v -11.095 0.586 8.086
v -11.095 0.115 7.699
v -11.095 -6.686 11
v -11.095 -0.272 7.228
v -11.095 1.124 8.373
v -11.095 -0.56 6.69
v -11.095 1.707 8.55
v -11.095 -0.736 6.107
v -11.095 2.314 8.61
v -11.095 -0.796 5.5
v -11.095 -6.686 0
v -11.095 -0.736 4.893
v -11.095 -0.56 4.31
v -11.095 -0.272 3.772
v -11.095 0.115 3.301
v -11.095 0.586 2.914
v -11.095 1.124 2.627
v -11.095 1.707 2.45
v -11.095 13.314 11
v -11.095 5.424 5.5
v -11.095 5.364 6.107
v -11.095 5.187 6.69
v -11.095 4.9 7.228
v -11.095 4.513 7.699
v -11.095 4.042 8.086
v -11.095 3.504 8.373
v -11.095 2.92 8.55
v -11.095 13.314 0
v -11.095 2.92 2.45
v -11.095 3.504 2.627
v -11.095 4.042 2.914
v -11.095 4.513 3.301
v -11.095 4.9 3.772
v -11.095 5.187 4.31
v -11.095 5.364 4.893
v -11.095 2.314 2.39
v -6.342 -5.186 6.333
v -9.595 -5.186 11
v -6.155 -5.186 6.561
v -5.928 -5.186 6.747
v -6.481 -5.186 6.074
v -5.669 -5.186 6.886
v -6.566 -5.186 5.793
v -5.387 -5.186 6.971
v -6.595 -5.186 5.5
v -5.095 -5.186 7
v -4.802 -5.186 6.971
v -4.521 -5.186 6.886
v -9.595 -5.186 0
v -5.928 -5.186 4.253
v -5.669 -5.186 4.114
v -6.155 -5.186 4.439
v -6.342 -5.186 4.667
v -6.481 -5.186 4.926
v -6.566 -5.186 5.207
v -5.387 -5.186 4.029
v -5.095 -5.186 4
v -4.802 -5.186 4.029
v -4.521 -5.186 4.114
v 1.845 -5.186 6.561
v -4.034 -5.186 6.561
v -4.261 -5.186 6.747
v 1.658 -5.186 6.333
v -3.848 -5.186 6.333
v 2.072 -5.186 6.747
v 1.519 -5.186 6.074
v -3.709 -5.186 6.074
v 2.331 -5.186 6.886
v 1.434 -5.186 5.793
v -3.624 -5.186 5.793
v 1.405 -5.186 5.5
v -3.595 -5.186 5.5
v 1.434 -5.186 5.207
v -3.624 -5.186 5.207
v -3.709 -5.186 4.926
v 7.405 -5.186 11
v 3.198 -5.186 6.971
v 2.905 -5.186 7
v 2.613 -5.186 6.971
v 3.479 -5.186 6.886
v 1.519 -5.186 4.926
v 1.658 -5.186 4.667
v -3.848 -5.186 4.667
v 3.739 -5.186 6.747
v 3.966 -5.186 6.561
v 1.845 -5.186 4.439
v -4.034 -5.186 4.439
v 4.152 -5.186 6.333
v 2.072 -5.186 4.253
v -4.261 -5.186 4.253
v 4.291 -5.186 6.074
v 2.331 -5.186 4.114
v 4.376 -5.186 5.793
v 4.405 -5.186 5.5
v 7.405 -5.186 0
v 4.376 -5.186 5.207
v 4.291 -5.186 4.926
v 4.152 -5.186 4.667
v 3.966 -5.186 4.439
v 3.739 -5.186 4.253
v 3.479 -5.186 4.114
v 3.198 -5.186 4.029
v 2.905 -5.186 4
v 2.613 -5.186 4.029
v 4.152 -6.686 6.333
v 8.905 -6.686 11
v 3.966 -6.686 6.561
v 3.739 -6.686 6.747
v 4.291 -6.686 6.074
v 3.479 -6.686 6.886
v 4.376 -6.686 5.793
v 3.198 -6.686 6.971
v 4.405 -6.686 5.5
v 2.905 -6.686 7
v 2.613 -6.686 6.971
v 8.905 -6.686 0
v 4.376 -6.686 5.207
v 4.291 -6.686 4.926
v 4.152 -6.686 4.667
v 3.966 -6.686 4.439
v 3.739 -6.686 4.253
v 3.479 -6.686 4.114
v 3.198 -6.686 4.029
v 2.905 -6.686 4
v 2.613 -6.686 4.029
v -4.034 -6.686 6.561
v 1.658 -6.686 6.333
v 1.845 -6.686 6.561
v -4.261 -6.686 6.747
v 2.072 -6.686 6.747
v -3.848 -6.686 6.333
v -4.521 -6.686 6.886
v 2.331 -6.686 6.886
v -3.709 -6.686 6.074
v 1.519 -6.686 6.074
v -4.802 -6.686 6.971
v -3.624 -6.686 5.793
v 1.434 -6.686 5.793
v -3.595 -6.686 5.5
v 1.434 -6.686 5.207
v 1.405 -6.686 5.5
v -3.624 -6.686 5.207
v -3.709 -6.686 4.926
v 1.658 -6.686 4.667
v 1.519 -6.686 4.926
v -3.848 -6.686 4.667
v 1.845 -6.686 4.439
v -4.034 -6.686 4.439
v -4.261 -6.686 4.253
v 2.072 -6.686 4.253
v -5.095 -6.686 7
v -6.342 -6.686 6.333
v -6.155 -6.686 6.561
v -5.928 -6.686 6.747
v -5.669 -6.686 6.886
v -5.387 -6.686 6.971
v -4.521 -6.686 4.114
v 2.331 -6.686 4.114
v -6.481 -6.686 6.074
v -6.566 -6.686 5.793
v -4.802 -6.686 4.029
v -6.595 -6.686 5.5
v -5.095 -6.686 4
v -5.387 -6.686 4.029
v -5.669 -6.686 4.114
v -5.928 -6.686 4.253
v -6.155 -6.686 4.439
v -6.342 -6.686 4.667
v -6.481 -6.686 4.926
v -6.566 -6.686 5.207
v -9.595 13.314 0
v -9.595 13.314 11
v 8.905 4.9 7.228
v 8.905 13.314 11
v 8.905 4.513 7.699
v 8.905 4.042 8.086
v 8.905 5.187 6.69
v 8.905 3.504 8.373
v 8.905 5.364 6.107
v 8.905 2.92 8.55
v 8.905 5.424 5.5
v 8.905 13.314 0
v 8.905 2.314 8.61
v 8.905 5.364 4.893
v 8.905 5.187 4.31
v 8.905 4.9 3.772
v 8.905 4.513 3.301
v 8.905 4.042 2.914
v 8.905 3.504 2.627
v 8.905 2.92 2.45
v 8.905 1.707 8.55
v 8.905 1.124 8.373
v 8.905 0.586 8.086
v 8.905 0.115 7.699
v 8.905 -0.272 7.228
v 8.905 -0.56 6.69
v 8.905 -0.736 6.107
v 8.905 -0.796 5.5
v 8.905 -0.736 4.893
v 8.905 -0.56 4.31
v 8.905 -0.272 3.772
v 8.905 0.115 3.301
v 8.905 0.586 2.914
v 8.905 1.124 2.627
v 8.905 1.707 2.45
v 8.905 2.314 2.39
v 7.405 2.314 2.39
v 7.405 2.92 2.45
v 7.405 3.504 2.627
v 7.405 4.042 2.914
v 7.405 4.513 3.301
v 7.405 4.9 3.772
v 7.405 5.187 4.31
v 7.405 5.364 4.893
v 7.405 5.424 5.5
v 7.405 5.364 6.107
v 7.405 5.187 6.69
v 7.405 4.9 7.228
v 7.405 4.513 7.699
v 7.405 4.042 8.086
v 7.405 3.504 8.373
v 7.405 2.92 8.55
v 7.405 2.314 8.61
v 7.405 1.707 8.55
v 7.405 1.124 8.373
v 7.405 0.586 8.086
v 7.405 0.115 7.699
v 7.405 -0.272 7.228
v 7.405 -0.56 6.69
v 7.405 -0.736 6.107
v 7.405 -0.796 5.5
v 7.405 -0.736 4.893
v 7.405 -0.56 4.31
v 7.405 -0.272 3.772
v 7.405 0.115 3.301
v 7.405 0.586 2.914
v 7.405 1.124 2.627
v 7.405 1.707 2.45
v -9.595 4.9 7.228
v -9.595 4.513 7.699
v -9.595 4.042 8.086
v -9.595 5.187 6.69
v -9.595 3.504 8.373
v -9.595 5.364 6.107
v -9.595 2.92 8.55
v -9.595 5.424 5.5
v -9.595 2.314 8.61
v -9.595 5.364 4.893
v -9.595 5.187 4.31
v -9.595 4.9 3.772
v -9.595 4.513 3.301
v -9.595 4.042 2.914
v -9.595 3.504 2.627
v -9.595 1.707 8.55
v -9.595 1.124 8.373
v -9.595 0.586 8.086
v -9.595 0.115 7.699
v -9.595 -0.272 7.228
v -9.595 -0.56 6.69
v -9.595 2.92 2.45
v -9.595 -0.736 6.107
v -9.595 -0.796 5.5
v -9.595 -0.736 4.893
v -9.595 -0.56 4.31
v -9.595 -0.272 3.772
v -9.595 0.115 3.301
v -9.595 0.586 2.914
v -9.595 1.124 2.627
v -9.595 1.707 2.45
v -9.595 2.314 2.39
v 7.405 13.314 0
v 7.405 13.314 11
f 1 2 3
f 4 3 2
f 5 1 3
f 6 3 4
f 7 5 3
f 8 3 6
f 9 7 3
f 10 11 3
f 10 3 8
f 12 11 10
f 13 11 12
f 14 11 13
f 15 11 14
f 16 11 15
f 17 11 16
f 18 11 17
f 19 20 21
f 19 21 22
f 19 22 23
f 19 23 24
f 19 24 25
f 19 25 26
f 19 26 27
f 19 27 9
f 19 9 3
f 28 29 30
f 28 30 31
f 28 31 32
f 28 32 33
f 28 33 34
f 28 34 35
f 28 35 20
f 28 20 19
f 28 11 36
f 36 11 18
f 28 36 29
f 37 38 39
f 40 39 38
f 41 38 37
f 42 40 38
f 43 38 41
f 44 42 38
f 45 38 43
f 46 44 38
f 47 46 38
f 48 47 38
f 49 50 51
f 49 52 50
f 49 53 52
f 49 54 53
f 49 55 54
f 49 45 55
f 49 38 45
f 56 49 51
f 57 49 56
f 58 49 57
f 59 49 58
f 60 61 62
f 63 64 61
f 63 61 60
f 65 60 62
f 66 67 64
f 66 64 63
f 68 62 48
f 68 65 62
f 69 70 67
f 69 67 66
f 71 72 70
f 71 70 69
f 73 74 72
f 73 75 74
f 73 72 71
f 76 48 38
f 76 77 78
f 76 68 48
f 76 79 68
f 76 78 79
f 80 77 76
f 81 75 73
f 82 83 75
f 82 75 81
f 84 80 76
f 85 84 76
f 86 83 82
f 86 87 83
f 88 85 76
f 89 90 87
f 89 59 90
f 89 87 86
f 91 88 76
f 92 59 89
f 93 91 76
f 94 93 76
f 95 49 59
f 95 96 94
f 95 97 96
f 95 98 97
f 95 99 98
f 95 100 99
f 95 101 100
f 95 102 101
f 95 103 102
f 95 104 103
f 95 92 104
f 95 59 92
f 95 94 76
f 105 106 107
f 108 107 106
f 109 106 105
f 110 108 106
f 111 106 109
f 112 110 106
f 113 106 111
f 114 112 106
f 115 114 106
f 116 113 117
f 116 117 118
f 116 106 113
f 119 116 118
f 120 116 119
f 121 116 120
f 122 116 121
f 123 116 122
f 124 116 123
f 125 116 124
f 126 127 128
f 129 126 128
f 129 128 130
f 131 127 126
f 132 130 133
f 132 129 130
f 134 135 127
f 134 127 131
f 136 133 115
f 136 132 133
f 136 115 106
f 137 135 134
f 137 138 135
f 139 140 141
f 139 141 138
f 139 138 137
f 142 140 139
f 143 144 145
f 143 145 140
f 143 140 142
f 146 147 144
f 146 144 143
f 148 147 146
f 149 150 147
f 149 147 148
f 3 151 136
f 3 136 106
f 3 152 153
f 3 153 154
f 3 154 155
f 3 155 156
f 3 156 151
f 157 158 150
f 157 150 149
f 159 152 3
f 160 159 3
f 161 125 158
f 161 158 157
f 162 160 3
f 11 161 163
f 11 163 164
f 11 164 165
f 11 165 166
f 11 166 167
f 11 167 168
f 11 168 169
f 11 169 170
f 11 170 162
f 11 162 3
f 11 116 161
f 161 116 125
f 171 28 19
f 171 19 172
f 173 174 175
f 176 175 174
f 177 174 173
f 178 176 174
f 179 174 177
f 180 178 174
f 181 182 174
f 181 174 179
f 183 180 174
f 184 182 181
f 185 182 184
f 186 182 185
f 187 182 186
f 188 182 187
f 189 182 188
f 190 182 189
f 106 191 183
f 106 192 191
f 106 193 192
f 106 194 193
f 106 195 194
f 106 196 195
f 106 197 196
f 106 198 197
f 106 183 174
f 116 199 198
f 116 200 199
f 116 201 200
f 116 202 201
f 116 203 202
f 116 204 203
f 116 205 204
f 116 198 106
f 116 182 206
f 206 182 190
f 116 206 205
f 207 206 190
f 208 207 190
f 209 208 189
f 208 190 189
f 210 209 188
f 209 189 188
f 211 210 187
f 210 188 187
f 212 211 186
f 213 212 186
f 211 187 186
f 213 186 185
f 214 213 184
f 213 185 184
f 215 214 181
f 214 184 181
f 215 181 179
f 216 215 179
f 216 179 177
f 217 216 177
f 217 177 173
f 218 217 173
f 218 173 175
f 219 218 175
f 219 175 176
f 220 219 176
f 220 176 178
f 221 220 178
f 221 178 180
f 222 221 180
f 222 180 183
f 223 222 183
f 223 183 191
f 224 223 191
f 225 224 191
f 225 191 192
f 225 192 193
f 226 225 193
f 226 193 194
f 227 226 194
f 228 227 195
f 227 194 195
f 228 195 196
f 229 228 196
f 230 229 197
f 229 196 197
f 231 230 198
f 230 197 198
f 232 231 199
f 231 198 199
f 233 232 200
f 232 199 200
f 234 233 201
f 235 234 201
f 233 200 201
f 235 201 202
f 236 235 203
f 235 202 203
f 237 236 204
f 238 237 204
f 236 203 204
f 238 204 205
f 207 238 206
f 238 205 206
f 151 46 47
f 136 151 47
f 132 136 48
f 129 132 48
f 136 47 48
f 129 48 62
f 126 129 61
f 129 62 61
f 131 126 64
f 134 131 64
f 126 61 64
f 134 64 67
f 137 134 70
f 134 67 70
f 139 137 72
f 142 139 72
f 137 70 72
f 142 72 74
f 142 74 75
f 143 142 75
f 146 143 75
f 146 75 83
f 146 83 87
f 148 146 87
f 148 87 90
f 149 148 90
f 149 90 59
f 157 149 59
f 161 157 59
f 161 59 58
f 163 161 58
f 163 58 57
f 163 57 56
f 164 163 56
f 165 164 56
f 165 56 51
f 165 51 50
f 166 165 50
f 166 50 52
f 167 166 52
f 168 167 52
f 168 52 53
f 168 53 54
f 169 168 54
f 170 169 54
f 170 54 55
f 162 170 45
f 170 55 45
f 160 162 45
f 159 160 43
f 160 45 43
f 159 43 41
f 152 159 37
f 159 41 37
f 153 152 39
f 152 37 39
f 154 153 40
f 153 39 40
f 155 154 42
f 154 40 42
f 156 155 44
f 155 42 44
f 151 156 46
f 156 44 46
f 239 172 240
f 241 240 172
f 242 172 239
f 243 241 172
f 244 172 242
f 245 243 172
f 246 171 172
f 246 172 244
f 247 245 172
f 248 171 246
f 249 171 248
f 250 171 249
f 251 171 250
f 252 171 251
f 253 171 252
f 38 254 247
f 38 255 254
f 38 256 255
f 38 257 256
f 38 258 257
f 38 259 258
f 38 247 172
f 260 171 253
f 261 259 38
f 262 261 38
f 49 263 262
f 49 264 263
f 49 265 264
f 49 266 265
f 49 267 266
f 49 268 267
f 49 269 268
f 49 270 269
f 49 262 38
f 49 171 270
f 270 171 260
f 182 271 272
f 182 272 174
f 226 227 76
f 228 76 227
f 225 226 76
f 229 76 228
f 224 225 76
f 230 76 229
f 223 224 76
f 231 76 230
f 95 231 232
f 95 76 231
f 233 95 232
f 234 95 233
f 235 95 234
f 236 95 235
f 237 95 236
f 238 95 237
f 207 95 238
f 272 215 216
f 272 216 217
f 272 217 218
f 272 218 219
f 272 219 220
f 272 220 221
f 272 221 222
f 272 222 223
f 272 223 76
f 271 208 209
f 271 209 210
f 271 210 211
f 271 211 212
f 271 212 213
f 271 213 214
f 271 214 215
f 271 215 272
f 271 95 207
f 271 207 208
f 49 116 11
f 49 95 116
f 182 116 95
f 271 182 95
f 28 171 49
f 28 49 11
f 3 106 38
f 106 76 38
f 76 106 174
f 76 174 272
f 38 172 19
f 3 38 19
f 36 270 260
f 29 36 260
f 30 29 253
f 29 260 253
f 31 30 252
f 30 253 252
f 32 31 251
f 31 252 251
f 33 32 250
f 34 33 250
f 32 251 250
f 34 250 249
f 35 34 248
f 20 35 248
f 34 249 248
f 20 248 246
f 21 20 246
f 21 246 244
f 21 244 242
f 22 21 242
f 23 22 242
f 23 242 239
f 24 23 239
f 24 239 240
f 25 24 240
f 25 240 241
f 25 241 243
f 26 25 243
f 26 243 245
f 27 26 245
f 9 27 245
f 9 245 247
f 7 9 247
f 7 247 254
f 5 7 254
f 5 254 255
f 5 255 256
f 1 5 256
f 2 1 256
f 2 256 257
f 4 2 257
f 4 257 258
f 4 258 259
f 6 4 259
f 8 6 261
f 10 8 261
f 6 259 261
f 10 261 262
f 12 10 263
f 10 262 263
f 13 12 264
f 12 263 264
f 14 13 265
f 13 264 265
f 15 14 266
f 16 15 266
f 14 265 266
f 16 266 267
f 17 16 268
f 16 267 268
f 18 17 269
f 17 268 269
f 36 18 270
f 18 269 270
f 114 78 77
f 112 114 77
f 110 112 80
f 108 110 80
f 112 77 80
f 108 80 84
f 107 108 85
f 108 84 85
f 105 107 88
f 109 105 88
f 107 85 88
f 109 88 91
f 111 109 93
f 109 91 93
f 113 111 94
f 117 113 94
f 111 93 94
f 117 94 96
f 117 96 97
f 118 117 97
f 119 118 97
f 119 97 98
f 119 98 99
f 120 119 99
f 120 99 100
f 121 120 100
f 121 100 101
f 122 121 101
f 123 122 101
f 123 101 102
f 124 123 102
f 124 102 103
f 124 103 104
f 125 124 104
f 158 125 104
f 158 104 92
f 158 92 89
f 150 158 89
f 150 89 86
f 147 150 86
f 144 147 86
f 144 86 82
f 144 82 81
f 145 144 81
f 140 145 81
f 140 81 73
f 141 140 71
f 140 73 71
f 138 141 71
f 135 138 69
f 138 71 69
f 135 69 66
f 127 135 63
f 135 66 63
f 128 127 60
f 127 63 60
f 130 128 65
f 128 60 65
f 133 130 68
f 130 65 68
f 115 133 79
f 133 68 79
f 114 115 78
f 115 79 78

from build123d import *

# Parameters (mm, degrees)
EXTRUSION1_DEPTH = 11
ESQUISSE2_R      = 3.11
EXTRUSION2_DEPTH = 27.424530578
ESQUISSE3_R      = 1.5
EXTRUSION3_DEPTH = 11


with BuildPart() as part:
    # Esquisse1 → Extrusion1 (new body)
    with BuildSketch(Plane.XY):
        Polygon((-11.094787824, -6.686254611), (-11.094787824, 13.313745389), (-9.594787824, 13.313745389), (-9.594787824, -5.186254611), (7.405212176, -5.186254611), (7.405212176, 13.313745389), (8.905212176, 13.313745389), (8.905212176, -6.686254611), align=None)
    extrude(amount=EXTRUSION1_DEPTH)

    # Esquisse2 → Extrusion2 (cut, through all)
    with BuildSketch(Plane(origin=(8.905212176, 0, 0), x_dir=(0, 0, -1), z_dir=(1, 0, 0))):
        with Locations((-5.5, 2.313745389)):
            Circle(ESQUISSE2_R)
    extrude(amount=-EXTRUSION2_DEPTH, mode=Mode.SUBTRACT)

    # Esquisse3 → Extrusion3 (cut)
    with BuildSketch(Plane(origin=(0, -5.186254611, 0), x_dir=(-1, 0, 0), z_dir=(0, 1, 0))):
        with Locations(Location((5.094787824, 5.5, 0), (0, 0, 90))):
            Circle(ESQUISSE3_R)
        with Locations(Location((-2.905212176, 5.5, 0), (0, 0, 90))):
            Circle(ESQUISSE3_R)
    extrude(amount=-EXTRUSION3_DEPTH, mode=Mode.SUBTRACT)


solid = part.part
